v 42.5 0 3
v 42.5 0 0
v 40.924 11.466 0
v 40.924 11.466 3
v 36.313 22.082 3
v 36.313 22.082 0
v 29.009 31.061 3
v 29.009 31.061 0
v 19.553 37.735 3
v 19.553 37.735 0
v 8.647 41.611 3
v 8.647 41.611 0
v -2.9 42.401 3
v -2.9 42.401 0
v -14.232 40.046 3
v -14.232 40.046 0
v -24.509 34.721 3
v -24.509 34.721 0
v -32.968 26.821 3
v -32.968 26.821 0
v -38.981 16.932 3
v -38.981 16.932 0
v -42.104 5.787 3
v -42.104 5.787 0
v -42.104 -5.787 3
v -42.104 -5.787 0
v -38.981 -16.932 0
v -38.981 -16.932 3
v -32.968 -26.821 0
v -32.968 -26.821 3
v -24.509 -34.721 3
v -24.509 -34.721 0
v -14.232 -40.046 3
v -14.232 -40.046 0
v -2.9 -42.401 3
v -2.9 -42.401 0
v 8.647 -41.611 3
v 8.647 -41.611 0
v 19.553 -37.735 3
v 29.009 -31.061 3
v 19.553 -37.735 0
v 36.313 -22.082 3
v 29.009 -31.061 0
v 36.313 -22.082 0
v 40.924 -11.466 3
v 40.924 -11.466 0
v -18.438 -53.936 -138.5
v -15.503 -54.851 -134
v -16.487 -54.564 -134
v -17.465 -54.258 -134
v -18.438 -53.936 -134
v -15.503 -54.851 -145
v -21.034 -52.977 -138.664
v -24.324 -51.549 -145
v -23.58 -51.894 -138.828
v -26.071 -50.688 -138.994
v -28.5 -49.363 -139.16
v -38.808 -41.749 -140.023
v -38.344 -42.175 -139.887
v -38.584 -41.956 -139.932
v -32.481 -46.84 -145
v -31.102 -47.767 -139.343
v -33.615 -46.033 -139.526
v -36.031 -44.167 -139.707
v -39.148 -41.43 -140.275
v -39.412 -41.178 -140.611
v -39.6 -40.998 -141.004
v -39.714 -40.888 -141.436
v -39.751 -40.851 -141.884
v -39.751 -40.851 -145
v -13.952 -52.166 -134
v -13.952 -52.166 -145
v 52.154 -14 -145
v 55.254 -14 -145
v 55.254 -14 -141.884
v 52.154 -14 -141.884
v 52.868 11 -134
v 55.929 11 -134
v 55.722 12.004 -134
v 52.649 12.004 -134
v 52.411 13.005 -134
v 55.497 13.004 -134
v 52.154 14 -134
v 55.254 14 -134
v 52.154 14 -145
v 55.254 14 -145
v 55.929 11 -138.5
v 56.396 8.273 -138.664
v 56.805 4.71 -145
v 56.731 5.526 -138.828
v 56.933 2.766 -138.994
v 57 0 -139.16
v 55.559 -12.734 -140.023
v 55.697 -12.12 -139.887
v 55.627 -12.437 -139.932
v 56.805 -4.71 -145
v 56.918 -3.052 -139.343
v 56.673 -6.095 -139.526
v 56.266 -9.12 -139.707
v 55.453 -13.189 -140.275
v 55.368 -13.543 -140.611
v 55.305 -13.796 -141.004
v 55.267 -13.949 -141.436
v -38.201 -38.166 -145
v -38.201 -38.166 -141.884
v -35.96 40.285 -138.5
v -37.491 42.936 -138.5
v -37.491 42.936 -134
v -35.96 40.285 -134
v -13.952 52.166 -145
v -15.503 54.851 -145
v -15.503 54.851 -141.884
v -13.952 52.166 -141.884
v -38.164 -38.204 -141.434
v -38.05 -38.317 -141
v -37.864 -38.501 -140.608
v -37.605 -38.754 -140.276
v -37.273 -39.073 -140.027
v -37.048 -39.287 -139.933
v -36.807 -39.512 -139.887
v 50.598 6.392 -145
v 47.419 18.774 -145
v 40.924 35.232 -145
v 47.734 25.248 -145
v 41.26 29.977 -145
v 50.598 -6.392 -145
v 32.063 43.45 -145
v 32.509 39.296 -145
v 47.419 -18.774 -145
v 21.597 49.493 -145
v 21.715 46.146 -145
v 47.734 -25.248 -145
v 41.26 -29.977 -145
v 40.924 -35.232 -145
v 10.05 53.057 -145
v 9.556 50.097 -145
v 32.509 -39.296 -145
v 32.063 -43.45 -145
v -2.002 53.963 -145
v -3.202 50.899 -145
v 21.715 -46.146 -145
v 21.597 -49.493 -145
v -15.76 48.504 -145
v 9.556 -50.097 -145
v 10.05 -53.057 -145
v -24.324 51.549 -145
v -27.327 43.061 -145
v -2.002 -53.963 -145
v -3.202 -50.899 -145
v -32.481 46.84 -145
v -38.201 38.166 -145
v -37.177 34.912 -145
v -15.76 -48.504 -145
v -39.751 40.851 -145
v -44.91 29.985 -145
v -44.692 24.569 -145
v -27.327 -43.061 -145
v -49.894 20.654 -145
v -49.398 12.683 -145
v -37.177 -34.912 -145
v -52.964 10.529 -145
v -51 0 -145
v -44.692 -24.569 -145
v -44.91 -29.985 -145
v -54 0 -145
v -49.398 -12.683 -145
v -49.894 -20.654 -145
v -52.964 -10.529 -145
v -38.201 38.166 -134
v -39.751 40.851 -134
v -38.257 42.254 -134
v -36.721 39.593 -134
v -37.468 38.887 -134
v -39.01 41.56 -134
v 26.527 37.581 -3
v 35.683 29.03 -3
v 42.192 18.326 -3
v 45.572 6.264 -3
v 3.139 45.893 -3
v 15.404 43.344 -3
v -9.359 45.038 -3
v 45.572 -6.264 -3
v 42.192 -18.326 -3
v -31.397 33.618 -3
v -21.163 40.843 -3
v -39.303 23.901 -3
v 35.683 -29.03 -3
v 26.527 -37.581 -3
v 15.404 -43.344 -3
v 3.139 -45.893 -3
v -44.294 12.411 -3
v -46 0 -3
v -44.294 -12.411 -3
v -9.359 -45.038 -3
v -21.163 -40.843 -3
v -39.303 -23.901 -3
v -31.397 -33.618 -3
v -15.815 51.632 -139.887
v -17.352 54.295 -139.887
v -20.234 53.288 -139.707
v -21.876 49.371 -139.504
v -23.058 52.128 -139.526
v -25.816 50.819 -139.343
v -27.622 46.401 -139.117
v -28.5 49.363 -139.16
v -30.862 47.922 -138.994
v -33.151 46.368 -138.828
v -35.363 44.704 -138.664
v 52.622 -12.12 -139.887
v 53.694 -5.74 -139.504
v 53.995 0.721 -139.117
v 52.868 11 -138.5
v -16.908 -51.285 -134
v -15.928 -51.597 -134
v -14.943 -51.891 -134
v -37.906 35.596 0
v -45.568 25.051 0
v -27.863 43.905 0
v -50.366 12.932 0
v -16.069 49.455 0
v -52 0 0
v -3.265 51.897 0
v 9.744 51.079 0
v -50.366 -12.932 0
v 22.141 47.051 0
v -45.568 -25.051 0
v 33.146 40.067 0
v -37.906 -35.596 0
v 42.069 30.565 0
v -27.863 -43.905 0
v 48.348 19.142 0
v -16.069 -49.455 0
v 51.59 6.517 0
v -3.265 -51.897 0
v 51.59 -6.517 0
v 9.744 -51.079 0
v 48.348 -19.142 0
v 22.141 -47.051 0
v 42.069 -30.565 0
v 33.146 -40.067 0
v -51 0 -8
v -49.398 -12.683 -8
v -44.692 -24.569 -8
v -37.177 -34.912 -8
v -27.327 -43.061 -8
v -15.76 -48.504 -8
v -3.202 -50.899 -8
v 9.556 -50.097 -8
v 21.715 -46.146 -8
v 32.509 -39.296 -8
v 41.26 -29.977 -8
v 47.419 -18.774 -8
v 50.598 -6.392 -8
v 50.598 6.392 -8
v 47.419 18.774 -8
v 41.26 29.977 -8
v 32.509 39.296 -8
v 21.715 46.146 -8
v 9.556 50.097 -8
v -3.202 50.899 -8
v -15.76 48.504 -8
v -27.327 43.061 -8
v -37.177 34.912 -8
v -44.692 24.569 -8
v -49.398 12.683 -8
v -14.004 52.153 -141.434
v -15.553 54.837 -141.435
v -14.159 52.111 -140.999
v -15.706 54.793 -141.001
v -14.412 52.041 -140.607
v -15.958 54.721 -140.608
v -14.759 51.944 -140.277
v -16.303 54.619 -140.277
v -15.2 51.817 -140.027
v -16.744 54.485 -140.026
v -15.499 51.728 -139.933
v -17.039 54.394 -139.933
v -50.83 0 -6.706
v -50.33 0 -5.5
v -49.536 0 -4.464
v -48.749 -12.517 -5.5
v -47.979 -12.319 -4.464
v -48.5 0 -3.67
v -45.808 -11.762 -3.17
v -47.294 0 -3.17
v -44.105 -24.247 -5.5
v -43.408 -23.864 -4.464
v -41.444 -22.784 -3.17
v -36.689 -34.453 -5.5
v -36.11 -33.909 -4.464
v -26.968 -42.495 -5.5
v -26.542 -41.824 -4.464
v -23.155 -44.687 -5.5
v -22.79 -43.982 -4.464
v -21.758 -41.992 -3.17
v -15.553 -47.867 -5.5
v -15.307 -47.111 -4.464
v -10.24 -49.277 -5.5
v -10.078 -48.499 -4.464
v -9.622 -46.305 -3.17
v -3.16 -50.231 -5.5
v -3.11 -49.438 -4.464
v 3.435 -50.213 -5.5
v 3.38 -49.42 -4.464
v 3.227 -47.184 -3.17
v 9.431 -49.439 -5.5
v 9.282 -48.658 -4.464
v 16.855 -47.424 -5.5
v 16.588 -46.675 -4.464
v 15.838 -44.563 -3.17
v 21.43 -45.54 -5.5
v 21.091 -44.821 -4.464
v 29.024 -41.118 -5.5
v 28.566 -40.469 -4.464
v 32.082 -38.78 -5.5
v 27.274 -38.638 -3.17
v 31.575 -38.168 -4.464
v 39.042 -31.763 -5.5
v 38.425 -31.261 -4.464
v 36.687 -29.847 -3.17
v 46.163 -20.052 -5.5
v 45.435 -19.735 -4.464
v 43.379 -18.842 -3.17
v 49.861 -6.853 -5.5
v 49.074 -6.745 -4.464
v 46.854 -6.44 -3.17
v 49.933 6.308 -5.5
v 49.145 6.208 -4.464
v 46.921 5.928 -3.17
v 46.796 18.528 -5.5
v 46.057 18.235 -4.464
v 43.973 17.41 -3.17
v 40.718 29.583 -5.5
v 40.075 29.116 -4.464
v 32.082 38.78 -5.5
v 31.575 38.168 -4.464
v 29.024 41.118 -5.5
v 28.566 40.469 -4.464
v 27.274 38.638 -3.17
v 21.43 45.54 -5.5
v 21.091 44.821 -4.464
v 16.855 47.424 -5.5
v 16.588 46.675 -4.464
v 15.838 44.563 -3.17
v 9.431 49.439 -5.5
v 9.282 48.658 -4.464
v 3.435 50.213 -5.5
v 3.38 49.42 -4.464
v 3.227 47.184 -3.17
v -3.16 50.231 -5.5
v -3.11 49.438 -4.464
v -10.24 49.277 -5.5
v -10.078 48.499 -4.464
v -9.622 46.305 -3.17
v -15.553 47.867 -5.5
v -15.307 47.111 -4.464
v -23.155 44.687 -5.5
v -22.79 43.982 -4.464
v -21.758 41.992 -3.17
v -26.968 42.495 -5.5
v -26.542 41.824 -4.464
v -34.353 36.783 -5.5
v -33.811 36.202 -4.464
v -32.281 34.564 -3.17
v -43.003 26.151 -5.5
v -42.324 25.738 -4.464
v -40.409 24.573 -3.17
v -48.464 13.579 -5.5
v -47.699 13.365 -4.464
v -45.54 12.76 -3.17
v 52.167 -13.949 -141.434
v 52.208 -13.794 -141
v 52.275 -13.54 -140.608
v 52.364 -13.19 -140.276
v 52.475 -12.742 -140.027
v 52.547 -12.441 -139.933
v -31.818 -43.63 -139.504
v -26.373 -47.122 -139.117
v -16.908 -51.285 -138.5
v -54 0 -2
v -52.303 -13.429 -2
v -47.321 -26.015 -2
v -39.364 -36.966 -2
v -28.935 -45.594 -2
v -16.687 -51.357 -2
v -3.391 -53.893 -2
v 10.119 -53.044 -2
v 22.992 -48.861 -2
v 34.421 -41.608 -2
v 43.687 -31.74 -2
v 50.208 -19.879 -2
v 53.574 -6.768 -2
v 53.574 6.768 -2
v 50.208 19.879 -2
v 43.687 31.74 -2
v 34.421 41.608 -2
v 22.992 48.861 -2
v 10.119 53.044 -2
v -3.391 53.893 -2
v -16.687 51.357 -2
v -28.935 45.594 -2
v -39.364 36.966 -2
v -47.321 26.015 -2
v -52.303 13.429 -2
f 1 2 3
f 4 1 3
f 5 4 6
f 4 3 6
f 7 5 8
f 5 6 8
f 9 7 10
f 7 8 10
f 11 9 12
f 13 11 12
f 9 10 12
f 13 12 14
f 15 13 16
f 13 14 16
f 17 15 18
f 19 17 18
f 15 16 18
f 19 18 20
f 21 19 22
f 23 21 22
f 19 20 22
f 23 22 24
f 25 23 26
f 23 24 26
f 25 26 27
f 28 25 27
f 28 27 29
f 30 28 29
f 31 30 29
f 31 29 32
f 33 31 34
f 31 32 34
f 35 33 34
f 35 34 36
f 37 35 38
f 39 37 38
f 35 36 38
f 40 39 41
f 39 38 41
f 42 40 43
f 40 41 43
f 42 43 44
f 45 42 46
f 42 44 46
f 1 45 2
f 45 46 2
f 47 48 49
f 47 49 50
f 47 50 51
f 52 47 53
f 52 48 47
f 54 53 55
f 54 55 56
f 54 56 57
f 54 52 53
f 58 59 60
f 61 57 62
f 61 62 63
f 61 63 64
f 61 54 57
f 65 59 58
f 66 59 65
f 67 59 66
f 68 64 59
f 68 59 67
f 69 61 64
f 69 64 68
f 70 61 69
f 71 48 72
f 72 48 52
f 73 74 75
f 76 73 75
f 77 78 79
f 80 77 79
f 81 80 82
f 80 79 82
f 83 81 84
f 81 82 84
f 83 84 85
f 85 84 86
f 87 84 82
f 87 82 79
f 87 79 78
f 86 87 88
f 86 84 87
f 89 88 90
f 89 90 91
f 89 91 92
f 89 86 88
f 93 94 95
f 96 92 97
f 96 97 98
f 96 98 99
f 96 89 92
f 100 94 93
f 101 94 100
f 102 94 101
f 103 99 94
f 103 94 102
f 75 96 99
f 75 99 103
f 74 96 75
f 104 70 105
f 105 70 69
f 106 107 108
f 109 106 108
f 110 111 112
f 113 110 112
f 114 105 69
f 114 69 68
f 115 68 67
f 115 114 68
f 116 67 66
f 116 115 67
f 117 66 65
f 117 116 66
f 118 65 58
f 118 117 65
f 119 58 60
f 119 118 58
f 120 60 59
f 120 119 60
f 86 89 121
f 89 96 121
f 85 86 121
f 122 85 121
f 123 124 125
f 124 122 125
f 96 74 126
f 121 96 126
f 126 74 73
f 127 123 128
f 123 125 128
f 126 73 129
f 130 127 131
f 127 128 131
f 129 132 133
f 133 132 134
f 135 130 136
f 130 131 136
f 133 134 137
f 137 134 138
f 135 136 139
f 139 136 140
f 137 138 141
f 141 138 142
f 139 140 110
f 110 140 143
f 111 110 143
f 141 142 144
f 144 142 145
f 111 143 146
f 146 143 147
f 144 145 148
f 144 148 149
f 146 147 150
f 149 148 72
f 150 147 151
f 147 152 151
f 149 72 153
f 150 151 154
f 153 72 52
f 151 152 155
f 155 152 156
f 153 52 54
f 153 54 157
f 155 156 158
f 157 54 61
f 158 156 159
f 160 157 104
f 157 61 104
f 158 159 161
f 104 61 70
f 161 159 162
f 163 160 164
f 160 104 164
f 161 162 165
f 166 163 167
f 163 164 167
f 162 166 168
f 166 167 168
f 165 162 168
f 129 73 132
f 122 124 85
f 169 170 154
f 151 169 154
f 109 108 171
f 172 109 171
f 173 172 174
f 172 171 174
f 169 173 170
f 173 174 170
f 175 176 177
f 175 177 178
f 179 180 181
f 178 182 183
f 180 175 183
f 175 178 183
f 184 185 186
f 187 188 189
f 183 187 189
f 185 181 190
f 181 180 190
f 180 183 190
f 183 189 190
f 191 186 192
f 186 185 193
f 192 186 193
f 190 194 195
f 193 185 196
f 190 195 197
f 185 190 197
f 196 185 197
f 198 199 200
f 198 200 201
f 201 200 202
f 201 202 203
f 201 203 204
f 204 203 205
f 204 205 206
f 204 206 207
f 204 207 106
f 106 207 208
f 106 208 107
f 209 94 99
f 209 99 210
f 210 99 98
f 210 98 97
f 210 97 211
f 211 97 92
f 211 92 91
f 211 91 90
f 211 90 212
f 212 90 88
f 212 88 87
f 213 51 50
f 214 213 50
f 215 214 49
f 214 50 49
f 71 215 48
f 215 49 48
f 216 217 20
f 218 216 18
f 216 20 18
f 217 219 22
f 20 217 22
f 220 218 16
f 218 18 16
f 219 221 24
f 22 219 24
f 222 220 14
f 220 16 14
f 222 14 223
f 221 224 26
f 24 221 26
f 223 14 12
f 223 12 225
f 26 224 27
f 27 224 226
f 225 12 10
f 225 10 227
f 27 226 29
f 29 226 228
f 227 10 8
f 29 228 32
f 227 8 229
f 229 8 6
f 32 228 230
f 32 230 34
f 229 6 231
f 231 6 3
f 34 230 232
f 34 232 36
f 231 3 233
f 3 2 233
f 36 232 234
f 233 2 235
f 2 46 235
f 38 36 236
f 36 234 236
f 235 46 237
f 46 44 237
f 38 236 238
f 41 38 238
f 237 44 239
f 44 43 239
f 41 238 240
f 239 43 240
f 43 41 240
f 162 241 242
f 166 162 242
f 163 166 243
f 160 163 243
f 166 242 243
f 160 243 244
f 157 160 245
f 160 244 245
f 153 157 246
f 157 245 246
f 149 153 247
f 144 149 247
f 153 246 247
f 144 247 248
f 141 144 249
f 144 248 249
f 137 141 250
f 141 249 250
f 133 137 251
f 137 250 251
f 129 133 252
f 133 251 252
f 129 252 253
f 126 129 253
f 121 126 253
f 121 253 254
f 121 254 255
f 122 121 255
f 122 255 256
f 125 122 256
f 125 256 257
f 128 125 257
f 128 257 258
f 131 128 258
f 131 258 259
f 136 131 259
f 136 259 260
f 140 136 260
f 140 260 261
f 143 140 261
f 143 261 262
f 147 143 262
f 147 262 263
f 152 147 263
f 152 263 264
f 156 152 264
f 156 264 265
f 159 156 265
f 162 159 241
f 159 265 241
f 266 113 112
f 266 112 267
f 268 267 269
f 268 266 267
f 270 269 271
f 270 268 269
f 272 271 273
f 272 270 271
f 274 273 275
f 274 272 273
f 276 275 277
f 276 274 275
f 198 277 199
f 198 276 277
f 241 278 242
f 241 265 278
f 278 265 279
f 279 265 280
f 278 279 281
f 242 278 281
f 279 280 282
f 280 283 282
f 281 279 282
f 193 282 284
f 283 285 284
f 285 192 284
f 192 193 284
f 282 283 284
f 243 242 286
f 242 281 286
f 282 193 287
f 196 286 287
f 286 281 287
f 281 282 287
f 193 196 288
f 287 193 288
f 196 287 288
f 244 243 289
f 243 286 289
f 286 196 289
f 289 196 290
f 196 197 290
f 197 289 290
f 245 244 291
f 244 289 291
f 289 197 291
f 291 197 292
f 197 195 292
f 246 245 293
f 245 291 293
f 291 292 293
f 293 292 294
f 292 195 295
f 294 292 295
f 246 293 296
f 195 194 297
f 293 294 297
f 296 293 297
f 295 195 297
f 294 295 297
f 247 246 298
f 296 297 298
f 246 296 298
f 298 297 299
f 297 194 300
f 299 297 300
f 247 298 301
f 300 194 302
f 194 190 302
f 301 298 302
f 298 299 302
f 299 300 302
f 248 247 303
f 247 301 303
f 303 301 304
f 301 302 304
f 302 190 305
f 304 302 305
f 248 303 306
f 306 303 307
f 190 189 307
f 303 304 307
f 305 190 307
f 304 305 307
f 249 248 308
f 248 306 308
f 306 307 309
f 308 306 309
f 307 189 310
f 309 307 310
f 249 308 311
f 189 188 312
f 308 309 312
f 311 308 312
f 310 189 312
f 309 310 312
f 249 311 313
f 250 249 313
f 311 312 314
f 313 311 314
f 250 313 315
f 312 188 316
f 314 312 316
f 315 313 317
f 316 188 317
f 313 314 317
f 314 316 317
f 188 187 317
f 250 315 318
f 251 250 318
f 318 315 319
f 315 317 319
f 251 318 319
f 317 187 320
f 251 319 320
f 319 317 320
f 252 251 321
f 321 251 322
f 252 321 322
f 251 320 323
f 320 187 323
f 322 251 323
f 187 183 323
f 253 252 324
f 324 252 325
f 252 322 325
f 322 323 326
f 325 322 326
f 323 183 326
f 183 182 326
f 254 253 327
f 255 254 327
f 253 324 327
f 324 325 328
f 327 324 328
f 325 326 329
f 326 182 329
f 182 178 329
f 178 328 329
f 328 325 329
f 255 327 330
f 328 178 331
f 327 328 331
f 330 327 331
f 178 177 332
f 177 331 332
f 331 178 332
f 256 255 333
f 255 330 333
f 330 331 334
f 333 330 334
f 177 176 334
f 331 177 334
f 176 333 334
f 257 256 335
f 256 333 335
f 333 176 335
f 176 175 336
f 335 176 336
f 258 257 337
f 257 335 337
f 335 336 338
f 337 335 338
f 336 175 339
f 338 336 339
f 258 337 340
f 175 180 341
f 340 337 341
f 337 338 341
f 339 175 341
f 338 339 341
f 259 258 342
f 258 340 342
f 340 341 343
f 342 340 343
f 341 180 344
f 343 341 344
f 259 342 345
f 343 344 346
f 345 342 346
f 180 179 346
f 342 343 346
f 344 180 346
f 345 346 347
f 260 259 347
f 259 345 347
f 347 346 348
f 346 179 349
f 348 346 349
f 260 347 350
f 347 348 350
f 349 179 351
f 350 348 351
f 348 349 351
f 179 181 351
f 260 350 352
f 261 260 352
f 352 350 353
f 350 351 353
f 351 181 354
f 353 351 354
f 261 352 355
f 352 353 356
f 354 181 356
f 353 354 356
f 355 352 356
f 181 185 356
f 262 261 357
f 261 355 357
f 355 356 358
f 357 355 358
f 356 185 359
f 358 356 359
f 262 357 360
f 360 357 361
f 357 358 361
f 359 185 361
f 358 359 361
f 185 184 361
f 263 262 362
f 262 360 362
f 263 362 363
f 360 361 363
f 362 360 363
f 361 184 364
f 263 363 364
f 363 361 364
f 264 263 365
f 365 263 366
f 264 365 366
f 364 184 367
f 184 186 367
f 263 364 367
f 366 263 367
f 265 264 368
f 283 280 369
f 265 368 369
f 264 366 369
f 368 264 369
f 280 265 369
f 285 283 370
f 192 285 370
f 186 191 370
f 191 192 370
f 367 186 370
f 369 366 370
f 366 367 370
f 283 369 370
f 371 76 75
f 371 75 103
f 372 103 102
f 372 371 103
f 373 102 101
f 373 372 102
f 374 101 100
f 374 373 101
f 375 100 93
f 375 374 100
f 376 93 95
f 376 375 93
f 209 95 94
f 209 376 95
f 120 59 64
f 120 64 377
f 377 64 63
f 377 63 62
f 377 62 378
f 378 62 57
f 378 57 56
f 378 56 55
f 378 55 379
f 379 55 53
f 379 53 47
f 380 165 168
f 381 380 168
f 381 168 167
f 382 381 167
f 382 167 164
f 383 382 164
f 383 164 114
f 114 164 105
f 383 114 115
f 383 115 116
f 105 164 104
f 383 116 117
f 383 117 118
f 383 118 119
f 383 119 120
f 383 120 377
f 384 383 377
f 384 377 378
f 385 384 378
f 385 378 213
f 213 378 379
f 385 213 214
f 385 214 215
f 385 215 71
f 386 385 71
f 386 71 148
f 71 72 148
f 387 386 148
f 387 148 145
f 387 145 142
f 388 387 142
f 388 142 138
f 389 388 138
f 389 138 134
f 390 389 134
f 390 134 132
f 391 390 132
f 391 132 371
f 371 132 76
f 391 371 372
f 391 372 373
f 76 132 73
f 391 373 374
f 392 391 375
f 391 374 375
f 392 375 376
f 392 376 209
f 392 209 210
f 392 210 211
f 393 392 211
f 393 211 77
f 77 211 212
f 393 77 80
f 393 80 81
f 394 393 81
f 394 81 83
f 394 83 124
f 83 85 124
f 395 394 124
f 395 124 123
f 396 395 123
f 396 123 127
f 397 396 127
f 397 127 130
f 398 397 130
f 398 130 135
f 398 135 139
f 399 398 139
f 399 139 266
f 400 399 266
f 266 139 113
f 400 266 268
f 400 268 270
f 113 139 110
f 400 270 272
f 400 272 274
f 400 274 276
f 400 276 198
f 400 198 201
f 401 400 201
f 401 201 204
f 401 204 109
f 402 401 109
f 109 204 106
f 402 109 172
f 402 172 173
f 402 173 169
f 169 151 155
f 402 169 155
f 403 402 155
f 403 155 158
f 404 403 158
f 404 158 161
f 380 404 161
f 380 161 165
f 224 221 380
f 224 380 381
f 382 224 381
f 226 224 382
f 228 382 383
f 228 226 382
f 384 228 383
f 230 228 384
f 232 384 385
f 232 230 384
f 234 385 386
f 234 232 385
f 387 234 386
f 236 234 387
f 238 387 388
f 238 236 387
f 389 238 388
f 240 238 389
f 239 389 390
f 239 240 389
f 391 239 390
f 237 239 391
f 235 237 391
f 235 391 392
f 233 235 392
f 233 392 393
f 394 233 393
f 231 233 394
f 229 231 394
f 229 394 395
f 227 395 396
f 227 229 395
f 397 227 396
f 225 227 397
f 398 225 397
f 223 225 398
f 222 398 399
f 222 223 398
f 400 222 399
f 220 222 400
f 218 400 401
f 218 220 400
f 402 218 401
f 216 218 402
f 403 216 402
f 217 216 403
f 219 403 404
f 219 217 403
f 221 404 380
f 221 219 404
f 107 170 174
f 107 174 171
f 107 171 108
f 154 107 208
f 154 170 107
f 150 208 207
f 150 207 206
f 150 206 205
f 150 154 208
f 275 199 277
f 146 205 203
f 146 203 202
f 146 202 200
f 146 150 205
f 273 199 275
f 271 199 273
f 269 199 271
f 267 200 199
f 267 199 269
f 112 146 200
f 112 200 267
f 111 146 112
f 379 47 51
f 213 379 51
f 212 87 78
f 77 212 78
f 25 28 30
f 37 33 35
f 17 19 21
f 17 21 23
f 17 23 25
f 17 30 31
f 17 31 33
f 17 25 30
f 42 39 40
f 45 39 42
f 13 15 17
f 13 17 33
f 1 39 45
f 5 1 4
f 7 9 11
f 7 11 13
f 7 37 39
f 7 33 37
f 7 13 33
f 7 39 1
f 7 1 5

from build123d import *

# Parameters (mm, degrees)
EXTRUDE_1_DEPTH                  = 10
FILLET_1_R                       = 2
PATTERN_CIRCULAR_2_COUNT         = 3
FILLET_1_OF_PATTERN_CIRCULAR_2_R = 2
CUT_EXTRUDE_START                = -15
SKETCH_3_R                       = 51
CUT_EXTRUDE_1_DEPTH              = 15
SKETCH_4_R                       = 62.618720145
SKETCH_4_R_2                     = 57
CUT_EXTRUDE_2_DEPTH              = 15
CHAMFER_1_SIZE                   = 2
FILLET_2_R                       = 5
SKETCH_5_R                       = 42.5
EXTRUDE_2_DEPTH                  = 3


with BuildPart() as part:
    # Эскиз1 → Повернуть1 (revolve)
    with BuildSketch(Plane(origin=(0, 0, 0), x_dir=(1, 0, 0), z_dir=(0, 1, 0))):
        Polygon((0, 0), (-54, 0), (-54, 145), (-51, 145), (-51, 3), (0, 3), align=None)
    revolve(axis=Axis((0, 0, -3), (0, 0, 1)))

    # Эскиз2 → Бобышка-Вытянуть1 (add)
    with BuildSketch(Plane(origin=(57, 0, 0), x_dir=(0, 0, -1), z_dir=(1, 0, 0))):
        Polygon((145, 14), (145, -14), (140, -14), (138.5, 11), (134, 11), (134, 14), align=None)
    extrude_1 = extrude(amount=-EXTRUDE_1_DEPTH)

    # Скругление1
    fillet_1_edges = [part.edges().sort_by_distance(p)[0] for p in [
        (54.576809621, -14, -140),
    ]]
    fillet(fillet_1_edges, radius=FILLET_1_R)

    # Круговой массив2: Бобышка-Вытянуть1 ×3 about axis
    pattern_circular_2_axis = Axis((0, 0, -145), (0, 0, -1))
    for i in range(1, PATTERN_CIRCULAR_2_COUNT):
        add(extrude_1.rotate(pattern_circular_2_axis, i * 360 / PATTERN_CIRCULAR_2_COUNT))

    # Скругление1 of Круговой массив2
    fillet_1_of_pattern_circular_2_edges = [part.edges().sort_by_distance(p)[0] for p in [
        (-39.412760463, -40.264903589, -140),
        (-15.164049157, 54.264903589, -140),
    ]]
    fillet(fillet_1_of_pattern_circular_2_edges, radius=FILLET_1_OF_PATTERN_CIRCULAR_2_R)

    # Эскиз3 → Вырез-Вытянуть1 (cut)
    with BuildSketch(Plane(origin=(0, 0, -145), x_dir=(-1, 0, 0), z_dir=(0, 0, -1)).offset(CUT_EXTRUDE_START)):
        Circle(SKETCH_3_R)
    extrude(amount=CUT_EXTRUDE_1_DEPTH, mode=Mode.SUBTRACT)

    # Эскиз4 → Вырез-Вытянуть2 (cut)
    with BuildSketch(Plane(origin=(0, 0, -145), x_dir=(-1, 0, 0), z_dir=(0, 0, -1))):
        Circle(SKETCH_4_R)
        Circle(SKETCH_4_R_2, mode=Mode.SUBTRACT)
    extrude(amount=-CUT_EXTRUDE_2_DEPTH, mode=Mode.SUBTRACT)

    # Фаска1
    chamfer_1_edges = [part.edges().sort_by_distance(p)[0] for p in [
        (54, 0, 0),
    ]]
    chamfer(chamfer_1_edges, length=CHAMFER_1_SIZE)

    # Скругление2
    fillet_2_edges = [part.edges().sort_by_distance(p)[0] for p in [
        (51, 0, -3),
    ]]
    fillet(fillet_2_edges, radius=FILLET_2_R)

    # Эскиз5 → Бобышка-Вытянуть2 (add)
    with BuildSketch(Plane.XY):
        Circle(SKETCH_5_R)
    extrude(amount=EXTRUDE_2_DEPTH)


solid = part.part
